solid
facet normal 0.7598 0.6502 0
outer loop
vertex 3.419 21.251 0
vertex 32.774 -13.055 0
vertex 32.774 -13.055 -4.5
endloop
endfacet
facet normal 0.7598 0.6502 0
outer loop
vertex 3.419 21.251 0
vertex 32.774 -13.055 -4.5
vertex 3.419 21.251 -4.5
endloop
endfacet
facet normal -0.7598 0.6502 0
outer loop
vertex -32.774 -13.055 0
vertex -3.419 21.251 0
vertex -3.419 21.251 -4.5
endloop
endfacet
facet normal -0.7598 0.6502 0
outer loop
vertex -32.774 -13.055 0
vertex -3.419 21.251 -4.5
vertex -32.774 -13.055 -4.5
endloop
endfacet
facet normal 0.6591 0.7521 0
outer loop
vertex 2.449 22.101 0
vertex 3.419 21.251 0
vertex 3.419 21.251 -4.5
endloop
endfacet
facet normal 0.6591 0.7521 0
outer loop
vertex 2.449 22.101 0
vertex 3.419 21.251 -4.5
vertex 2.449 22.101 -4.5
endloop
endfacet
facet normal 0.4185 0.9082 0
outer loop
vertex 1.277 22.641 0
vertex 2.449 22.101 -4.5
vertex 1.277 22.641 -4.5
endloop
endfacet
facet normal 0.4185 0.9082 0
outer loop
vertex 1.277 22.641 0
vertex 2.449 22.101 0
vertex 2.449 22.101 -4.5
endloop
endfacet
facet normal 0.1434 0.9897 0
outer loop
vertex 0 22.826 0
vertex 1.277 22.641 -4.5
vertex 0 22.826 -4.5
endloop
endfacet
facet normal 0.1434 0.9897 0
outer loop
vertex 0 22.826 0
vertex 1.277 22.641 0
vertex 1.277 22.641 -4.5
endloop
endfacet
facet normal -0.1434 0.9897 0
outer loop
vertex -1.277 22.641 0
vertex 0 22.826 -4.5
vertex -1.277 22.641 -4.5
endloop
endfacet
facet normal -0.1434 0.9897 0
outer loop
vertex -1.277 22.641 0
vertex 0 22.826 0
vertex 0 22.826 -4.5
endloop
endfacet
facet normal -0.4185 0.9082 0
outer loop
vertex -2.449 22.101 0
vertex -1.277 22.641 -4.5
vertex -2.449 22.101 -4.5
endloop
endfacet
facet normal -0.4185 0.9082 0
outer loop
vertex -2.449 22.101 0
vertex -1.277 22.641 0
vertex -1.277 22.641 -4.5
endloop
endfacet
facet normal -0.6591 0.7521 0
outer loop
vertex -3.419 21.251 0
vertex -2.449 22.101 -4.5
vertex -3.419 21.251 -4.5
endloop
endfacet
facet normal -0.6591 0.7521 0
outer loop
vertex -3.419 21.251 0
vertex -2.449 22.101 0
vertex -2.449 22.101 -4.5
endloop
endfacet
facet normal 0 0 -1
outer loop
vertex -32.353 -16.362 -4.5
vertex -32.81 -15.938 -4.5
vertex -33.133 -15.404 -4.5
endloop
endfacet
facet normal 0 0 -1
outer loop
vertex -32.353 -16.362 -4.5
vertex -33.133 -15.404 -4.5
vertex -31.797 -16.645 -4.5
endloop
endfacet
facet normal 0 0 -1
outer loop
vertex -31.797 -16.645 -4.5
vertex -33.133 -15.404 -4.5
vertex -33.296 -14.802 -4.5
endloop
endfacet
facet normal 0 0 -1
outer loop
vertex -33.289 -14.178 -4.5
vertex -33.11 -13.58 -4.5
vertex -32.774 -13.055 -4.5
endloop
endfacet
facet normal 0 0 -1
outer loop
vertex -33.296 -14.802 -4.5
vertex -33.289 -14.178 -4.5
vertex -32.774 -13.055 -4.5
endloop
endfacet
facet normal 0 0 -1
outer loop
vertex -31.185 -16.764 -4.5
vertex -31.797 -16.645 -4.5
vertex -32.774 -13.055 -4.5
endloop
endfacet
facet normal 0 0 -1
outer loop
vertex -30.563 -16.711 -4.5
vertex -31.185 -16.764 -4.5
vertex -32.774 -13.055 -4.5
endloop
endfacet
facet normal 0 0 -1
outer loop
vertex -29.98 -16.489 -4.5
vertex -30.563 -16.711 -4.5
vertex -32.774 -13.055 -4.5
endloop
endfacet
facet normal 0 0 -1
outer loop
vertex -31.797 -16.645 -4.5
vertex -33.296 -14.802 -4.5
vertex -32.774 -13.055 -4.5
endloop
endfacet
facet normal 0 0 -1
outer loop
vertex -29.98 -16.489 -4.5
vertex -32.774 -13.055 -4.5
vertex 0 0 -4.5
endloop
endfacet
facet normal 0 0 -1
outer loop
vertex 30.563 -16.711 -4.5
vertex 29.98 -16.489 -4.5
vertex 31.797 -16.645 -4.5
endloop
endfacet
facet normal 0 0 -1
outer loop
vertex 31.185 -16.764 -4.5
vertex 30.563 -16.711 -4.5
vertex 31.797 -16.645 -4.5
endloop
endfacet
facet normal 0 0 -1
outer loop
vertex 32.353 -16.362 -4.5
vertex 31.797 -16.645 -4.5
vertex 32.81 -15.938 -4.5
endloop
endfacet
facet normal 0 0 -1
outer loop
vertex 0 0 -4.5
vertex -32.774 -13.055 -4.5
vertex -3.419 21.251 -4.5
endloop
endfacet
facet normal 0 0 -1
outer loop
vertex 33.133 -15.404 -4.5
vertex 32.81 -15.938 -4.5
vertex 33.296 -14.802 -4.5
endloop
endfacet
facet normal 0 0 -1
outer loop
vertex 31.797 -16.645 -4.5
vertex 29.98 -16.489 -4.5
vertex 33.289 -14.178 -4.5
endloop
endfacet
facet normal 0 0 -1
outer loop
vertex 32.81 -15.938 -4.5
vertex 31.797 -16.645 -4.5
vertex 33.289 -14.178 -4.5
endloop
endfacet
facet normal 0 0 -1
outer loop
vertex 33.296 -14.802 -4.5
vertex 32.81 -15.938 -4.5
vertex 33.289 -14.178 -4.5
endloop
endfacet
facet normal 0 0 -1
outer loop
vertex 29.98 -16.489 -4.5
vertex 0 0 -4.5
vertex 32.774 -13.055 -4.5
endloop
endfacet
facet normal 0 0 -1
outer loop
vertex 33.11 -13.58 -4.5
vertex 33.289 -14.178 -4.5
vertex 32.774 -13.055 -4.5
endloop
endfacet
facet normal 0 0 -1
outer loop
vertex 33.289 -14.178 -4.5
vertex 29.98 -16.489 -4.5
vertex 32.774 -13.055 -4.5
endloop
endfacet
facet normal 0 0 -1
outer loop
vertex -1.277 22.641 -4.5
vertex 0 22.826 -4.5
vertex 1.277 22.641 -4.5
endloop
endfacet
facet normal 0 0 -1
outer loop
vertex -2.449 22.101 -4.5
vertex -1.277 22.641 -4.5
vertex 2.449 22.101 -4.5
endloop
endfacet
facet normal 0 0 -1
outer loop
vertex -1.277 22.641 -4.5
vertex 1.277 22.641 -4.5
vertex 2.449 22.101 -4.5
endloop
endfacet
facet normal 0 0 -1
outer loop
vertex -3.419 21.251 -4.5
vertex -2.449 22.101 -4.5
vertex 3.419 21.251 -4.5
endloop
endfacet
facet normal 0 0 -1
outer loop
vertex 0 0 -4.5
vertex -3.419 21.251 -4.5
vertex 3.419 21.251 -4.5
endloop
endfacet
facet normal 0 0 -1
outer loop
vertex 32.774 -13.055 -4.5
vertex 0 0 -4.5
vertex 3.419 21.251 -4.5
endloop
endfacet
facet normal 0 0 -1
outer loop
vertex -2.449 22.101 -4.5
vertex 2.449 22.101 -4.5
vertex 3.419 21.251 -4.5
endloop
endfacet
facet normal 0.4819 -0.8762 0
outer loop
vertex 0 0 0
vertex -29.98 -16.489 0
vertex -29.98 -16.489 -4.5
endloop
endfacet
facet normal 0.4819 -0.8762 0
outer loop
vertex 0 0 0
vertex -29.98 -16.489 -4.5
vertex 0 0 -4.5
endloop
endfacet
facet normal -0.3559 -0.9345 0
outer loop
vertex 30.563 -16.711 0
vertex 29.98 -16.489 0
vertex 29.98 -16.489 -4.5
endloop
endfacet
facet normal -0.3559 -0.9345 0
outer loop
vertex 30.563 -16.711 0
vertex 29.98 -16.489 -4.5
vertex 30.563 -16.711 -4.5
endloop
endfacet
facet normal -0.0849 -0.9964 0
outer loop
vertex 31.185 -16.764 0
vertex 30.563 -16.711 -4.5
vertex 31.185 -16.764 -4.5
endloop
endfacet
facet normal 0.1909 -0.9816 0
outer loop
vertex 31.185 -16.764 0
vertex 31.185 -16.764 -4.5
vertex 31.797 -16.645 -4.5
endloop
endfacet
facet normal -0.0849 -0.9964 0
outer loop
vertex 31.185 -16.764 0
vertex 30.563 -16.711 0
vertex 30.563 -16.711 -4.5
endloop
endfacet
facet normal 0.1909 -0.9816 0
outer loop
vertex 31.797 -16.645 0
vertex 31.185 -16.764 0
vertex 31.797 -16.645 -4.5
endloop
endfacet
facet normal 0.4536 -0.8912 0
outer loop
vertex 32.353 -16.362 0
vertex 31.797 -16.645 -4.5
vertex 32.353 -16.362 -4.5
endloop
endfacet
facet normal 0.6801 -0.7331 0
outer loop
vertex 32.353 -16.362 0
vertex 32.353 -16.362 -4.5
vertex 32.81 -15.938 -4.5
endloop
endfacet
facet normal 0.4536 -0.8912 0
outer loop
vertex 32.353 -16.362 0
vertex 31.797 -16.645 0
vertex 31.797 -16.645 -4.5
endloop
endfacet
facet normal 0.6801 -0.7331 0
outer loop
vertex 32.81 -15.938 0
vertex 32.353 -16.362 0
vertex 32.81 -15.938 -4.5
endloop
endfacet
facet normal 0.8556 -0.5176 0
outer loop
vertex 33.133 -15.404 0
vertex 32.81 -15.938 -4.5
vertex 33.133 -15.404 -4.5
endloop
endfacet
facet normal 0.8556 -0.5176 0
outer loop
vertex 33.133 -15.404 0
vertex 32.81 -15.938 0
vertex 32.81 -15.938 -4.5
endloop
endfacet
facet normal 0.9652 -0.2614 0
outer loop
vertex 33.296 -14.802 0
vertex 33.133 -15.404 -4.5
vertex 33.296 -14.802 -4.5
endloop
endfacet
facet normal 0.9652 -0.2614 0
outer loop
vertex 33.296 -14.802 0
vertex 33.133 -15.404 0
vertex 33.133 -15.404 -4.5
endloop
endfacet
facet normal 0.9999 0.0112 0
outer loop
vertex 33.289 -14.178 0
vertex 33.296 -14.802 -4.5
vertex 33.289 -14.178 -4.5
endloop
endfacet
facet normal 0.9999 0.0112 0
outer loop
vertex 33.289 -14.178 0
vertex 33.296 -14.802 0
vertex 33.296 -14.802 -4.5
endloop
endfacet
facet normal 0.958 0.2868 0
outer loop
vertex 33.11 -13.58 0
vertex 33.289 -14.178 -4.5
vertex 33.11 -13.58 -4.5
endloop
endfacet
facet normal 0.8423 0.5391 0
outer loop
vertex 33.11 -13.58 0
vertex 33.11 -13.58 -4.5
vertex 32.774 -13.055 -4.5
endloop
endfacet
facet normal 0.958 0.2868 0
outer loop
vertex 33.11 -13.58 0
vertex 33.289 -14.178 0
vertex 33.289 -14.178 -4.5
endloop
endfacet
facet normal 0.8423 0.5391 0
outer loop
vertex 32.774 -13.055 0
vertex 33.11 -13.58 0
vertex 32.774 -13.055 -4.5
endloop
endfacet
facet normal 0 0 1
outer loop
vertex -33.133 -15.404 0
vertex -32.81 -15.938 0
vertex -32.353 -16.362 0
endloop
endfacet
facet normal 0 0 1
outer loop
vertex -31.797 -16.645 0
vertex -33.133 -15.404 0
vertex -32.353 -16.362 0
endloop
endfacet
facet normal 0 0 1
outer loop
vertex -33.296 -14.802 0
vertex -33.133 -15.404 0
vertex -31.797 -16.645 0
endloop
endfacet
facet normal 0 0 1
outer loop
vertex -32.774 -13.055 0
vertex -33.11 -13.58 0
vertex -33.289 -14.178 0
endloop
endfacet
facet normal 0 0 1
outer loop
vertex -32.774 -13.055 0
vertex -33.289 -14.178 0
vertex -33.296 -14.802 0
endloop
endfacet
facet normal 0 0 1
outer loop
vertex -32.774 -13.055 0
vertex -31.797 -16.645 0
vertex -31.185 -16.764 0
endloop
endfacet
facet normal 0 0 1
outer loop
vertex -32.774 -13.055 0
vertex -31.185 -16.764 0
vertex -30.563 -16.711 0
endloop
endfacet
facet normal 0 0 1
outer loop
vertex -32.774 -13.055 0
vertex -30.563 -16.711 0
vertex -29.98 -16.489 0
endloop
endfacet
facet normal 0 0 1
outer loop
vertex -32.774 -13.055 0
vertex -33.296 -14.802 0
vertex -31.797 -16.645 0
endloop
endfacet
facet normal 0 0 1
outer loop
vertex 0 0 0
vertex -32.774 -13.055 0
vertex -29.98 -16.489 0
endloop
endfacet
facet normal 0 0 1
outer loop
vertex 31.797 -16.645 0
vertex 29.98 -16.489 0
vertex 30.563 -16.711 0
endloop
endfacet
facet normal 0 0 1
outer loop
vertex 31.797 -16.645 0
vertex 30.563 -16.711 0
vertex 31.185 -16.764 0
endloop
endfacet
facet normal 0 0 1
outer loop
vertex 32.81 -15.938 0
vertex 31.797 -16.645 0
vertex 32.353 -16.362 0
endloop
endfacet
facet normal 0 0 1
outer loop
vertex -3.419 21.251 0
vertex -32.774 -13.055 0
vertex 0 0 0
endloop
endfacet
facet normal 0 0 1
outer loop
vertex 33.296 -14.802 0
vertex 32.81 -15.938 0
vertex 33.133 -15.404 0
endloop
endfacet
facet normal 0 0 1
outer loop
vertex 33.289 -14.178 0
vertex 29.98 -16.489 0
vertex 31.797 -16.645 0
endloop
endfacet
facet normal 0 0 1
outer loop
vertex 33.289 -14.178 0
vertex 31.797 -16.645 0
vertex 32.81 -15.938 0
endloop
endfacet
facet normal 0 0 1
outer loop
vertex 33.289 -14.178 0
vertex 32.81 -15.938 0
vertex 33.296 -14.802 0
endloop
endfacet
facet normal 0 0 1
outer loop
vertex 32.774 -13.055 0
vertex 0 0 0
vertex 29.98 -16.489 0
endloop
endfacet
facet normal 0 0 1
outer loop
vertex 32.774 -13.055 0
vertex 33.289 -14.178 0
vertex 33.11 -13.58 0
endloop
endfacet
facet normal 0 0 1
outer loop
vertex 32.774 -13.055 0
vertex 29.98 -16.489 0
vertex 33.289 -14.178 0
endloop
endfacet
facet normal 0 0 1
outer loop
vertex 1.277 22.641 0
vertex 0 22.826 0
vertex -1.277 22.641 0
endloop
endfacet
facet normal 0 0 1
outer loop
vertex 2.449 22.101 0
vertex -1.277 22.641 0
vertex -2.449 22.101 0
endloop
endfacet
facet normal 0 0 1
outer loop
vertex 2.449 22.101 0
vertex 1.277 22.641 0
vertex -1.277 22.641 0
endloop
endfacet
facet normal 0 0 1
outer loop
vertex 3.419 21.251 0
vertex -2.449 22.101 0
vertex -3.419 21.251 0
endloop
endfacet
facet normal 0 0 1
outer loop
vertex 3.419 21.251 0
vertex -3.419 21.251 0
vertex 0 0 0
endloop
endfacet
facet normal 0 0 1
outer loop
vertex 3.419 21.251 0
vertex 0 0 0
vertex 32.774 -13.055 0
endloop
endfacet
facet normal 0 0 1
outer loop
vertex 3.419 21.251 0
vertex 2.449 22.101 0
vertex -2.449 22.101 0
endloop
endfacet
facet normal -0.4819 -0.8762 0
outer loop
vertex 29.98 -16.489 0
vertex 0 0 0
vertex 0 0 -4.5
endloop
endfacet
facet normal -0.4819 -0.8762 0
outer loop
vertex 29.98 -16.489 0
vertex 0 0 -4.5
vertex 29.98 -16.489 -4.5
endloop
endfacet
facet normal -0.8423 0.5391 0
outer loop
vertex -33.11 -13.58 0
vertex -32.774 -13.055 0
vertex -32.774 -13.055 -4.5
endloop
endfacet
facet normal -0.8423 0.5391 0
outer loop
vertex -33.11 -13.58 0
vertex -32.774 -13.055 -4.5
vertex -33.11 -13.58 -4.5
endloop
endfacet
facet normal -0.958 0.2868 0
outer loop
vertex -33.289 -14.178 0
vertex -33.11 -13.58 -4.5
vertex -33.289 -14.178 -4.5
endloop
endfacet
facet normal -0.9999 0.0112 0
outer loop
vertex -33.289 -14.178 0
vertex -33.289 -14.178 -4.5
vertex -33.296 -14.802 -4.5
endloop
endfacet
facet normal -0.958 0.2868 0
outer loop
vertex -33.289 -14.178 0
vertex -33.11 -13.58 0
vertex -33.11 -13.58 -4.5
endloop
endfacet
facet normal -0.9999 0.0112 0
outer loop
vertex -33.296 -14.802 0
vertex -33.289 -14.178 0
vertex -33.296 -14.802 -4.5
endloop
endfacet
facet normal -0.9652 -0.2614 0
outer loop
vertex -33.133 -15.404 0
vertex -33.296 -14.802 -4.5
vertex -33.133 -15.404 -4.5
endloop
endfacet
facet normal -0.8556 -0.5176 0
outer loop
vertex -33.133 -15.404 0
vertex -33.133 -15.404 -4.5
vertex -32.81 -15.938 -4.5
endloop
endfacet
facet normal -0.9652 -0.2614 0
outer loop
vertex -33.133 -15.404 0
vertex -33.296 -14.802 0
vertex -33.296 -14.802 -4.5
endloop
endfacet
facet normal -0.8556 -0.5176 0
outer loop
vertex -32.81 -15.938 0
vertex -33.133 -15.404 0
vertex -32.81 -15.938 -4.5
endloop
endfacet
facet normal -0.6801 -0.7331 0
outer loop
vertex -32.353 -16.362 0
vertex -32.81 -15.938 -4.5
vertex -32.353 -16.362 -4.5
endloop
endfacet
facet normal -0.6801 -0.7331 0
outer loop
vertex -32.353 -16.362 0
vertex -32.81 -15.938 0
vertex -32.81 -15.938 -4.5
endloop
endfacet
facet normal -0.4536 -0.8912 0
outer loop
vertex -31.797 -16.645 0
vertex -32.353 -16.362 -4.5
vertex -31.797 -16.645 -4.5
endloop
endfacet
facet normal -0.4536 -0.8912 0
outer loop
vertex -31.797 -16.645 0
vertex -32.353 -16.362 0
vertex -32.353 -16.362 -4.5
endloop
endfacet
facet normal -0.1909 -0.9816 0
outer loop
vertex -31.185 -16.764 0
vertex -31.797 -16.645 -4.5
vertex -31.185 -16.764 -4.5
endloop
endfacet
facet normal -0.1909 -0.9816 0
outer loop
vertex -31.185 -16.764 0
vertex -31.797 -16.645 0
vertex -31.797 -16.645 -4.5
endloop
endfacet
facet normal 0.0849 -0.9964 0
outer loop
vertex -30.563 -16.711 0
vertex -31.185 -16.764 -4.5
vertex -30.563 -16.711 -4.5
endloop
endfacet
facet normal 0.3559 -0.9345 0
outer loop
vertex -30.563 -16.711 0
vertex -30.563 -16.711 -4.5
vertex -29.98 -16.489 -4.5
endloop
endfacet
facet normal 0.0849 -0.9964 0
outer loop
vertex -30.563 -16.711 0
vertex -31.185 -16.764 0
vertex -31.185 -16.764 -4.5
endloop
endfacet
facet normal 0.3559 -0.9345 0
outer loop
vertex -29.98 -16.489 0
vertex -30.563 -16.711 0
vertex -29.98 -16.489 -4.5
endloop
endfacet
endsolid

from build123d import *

# Parameters (mm, degrees)
F1_DEPTH = 3
F2_SCALE = 1.5


with BuildPart() as f1:
    # F0 (on Top) → F1 (new body)
    with BuildSketch(Plane.XY):
        with BuildLine():
            Line((-2.279421823, 14.1675013068), (-21.849297046, -8.7031758937))
            ThreePointArc((-21.849297046, -8.7031758937), (-21.8731761415, -10.6250020098), (-19.9867063483, -10.9927214012))
            Line((-19.9867063483, -10.9927214012), (0, 0))
            Line((0, 0), (19.9867063483, -10.9927214012))
            ThreePointArc((19.9867063483, -10.9927214012), (21.8731761415, -10.6250020098), (21.849297046, -8.7031758937))
            Line((21.849297046, -8.7031758937), (2.279421823, 14.1675013068))
            ThreePointArc((2.279421823, 14.1675013068), (0, 15.2170561903), (-2.279421823, 14.1675013068))
        make_face()
    extrude(amount=-F1_DEPTH)


with BuildPart() as f1_1:
    # F2: moved
    add(f1.part.scale(F2_SCALE))


solid = f1_1.part
